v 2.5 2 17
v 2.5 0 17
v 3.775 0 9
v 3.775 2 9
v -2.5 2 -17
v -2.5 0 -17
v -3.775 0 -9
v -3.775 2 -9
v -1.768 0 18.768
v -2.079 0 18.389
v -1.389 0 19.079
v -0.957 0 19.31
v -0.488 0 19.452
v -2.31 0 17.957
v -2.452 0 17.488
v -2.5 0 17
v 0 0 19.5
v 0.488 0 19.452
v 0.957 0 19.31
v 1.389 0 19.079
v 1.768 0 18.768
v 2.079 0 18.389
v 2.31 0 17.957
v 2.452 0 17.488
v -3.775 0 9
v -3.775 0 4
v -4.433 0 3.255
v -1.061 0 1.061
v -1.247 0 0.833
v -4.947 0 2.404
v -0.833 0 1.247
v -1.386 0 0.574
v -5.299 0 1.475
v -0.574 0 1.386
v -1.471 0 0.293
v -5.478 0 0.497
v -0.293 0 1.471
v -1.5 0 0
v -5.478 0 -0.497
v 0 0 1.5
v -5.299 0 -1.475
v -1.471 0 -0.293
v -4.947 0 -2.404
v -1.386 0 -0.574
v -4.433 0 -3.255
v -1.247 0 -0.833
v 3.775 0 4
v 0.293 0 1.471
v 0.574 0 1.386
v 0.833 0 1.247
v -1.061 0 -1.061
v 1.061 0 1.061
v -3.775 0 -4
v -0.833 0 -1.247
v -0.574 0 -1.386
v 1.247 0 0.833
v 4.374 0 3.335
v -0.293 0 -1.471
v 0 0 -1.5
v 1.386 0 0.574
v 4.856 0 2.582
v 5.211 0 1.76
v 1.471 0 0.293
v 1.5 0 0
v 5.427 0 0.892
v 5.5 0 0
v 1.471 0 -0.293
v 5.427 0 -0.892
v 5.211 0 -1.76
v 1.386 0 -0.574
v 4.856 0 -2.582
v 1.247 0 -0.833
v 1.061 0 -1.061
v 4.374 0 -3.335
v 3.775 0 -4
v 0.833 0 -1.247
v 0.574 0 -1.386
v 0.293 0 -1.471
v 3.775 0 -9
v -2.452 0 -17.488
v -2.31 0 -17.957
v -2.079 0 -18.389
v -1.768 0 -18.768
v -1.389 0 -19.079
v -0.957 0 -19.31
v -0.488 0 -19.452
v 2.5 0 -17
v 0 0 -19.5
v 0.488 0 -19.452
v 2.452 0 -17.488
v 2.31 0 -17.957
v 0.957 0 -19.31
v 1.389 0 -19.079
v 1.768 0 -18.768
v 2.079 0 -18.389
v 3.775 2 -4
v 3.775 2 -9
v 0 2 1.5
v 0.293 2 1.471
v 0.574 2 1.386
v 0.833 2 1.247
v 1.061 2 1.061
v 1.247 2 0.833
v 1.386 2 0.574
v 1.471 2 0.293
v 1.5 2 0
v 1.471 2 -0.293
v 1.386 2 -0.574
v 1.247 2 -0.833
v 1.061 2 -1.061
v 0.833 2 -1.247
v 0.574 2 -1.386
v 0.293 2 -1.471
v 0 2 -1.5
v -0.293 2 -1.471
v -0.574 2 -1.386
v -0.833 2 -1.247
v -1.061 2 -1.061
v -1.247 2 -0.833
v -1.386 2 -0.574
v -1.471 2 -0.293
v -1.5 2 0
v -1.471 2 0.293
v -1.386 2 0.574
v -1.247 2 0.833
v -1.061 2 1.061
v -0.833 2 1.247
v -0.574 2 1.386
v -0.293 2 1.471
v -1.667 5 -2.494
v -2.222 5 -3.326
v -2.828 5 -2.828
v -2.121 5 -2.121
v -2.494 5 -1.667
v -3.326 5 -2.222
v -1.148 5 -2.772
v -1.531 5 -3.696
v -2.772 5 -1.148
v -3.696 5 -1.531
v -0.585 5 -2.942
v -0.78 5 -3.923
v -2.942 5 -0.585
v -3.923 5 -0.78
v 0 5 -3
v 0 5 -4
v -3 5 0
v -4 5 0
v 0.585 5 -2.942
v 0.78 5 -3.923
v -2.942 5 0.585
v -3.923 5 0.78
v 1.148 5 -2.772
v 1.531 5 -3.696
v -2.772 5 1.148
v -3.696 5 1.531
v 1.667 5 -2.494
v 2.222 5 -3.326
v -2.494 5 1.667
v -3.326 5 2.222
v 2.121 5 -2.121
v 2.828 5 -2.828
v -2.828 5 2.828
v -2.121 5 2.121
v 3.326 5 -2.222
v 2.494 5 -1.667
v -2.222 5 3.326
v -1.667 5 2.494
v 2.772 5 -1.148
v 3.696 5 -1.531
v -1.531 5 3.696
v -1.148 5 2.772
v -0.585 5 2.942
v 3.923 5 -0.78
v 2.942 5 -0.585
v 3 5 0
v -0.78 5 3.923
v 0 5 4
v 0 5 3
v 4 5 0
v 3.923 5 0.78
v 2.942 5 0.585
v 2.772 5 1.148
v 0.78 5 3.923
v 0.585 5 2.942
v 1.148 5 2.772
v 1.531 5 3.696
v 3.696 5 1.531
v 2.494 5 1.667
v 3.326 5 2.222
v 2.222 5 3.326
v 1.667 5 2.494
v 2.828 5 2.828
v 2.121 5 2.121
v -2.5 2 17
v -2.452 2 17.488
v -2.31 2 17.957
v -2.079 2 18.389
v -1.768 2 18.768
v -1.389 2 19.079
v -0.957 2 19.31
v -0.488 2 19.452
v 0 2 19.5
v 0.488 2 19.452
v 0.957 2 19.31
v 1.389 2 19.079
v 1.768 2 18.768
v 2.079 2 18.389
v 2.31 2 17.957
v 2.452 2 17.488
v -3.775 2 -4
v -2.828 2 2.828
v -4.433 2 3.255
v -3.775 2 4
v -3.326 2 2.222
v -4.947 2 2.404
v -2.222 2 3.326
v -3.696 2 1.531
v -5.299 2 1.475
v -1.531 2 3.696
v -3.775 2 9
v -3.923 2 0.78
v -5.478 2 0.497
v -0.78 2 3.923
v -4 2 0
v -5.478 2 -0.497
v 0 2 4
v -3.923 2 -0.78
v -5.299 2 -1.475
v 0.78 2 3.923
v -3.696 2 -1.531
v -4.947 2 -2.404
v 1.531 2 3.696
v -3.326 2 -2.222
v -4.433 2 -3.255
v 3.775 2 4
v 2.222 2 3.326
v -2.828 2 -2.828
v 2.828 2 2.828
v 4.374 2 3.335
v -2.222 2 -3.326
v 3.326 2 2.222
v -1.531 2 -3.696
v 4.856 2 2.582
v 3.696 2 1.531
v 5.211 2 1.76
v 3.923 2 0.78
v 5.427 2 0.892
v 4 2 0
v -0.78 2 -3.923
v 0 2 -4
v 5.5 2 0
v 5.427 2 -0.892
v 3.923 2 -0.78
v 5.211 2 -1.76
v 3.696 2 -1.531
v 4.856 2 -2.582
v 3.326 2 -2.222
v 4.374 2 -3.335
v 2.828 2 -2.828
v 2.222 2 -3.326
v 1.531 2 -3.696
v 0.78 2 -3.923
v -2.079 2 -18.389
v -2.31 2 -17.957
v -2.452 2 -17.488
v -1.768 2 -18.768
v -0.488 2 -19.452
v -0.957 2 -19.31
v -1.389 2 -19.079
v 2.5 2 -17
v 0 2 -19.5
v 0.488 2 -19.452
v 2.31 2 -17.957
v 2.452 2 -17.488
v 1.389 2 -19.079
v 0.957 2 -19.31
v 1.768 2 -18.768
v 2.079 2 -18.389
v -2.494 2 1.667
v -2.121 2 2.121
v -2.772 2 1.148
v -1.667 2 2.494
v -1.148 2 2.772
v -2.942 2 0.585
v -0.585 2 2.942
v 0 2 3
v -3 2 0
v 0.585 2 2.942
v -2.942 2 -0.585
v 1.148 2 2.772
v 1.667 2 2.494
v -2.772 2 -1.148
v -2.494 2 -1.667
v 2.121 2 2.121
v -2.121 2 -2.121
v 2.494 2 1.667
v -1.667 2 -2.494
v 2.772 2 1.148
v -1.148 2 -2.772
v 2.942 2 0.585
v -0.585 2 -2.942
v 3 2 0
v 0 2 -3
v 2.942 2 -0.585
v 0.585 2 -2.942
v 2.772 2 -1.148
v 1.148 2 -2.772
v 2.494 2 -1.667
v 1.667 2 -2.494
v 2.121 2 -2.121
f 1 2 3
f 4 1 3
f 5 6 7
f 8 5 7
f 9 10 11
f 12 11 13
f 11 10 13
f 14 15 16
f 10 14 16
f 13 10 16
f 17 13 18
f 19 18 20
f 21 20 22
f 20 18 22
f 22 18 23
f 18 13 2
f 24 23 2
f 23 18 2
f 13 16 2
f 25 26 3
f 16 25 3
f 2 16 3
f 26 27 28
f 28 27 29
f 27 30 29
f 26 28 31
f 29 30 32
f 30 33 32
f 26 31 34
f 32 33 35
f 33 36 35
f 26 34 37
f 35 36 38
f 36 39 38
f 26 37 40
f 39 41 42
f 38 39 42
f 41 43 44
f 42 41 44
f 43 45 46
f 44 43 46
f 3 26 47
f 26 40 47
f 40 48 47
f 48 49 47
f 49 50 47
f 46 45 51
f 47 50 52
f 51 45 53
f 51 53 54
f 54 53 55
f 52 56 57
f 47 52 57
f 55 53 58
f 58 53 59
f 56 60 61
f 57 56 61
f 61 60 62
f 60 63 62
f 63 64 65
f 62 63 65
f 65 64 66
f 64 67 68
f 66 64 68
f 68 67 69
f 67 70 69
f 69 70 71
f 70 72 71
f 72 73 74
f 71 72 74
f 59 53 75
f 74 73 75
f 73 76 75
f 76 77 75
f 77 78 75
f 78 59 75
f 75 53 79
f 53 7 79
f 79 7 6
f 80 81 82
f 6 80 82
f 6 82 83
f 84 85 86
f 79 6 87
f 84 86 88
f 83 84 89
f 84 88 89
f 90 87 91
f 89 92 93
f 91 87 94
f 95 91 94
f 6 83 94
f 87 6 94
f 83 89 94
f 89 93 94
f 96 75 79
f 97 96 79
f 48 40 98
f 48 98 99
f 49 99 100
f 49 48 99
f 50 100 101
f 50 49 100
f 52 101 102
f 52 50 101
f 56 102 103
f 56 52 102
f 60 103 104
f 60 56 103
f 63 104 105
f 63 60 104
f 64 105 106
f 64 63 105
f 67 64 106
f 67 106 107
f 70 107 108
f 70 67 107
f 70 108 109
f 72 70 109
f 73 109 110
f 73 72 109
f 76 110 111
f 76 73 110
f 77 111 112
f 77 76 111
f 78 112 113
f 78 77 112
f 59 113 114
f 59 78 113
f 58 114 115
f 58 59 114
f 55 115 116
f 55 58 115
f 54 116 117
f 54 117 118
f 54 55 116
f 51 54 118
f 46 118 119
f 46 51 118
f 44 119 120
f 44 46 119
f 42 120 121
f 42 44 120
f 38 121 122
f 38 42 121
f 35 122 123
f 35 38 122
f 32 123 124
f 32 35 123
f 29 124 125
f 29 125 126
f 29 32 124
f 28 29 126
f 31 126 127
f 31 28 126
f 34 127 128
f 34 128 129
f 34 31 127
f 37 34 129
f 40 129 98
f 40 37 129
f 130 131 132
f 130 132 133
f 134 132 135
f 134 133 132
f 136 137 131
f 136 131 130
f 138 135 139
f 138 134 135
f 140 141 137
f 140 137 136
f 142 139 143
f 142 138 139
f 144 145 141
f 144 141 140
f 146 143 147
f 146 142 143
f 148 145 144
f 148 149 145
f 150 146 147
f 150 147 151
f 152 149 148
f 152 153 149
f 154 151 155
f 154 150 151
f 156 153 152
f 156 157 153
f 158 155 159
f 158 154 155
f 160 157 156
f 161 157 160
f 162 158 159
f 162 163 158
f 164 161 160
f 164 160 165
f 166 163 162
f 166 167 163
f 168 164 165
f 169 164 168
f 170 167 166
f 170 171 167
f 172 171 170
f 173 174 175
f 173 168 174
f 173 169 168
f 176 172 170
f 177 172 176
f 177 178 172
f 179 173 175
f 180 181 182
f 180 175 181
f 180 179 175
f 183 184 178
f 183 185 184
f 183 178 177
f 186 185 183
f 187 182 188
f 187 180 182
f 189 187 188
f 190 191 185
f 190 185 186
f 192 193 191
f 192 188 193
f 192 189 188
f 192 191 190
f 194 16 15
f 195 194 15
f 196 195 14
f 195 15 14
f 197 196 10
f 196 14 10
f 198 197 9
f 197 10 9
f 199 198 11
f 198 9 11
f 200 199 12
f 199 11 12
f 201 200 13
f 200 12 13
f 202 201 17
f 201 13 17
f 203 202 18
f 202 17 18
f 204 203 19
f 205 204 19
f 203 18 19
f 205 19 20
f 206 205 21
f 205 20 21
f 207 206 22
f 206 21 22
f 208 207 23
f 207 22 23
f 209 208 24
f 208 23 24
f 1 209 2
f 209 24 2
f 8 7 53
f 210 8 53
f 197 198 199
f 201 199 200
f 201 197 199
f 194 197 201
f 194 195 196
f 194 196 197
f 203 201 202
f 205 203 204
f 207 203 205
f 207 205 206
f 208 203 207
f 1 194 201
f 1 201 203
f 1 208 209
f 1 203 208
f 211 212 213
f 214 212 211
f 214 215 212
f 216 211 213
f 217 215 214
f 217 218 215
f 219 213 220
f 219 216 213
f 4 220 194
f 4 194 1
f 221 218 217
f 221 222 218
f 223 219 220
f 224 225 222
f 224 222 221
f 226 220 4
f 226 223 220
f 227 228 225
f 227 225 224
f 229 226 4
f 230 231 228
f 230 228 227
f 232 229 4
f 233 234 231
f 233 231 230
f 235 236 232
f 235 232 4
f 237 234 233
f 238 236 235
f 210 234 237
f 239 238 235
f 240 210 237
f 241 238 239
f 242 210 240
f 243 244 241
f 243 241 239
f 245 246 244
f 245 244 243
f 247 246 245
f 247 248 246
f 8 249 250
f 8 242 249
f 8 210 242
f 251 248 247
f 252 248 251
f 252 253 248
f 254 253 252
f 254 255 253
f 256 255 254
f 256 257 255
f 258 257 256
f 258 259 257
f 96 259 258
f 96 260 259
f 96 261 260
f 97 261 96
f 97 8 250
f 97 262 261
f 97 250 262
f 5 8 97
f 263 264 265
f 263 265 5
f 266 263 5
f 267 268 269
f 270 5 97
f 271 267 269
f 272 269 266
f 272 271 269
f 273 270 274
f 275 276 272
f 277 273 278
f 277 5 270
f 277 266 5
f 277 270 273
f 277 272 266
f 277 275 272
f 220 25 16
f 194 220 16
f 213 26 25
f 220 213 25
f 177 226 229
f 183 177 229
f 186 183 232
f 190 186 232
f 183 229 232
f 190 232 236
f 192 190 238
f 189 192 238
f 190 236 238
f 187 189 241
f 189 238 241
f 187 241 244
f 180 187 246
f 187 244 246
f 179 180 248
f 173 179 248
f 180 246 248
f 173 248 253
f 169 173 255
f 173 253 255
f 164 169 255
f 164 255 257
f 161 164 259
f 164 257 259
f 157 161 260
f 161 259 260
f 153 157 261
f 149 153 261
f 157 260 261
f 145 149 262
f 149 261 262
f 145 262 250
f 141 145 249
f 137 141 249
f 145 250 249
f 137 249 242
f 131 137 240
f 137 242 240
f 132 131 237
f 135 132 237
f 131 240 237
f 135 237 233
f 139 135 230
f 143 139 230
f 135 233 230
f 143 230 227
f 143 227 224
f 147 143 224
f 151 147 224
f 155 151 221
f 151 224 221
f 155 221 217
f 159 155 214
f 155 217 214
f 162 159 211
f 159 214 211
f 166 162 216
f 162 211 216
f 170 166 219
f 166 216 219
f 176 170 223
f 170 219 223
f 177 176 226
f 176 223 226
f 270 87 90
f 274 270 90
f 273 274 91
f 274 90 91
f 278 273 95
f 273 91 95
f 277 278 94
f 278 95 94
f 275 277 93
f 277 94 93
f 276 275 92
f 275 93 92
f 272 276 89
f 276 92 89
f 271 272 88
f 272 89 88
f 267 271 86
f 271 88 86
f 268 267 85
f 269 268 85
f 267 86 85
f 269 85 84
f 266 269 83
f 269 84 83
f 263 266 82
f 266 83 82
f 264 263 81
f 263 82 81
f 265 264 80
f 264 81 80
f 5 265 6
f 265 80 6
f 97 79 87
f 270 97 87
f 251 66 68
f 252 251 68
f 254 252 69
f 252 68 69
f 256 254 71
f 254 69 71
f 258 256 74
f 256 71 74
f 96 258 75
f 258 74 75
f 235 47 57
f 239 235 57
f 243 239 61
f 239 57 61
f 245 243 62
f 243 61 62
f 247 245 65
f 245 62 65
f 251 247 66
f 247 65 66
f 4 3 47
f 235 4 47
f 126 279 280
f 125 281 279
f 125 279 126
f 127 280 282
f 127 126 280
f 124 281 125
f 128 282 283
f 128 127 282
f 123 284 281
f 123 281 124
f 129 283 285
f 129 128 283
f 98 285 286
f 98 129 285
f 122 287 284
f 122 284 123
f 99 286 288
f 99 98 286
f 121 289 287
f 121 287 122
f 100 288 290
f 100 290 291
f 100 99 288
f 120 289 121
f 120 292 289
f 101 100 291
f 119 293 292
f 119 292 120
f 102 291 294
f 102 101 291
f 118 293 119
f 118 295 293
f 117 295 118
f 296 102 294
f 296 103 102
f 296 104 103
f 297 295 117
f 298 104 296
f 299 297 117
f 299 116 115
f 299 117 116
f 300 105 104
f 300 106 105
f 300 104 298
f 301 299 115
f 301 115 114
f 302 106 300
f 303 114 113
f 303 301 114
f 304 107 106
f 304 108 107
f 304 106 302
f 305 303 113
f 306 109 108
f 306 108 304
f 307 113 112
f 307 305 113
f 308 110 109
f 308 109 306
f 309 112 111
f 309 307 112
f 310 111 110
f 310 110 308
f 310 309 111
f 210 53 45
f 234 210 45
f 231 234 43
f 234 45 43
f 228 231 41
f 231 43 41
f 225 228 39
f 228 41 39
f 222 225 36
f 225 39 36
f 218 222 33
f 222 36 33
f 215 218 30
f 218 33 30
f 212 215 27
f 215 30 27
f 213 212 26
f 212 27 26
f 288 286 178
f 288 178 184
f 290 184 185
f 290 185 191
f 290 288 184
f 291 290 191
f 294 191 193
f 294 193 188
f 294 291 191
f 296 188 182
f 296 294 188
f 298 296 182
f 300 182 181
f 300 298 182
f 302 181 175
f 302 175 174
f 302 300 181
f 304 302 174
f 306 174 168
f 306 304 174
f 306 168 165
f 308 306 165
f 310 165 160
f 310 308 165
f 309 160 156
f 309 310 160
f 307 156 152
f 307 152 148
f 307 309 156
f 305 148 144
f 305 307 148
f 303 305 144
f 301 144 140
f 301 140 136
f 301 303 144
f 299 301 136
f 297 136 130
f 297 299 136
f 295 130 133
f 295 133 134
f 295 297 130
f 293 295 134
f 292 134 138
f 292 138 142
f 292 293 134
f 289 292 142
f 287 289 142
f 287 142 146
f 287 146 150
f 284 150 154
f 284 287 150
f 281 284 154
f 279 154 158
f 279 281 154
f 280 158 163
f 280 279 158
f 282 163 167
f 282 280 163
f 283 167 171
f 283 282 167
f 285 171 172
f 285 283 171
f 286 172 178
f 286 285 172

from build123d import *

# Parameters (mm, degrees)
SKETCH1_R           = 1.5
BOSS_EXTRUDE1_DEPTH = 2
SKETCH2_R           = 4
SKETCH2_R_2         = 3
BOSS_EXTRUDE2_DEPTH = 3


with BuildPart() as part:
    # Sketch1 → Boss-Extrude1 (new body)
    # profile 1 of 5: a face of its own
    with BuildSketch(Plane(origin=(0, 0, 0), x_dir=(1, 0, 0), z_dir=(0, 1, 0))):
        with BuildLine():
            Line((-3.774917218, 9), (-3.774917218, 4))
            ThreePointArc((-3.774917218, 4), (0, 5.5), (3.774917218, 4))
            Line((3.774917218, 4), (3.774917218, 9))
            Line((3.774917218, 9), (2.5, 17))
            ThreePointArc((2.5, 17), (0, 19.5), (-2.5, 17))
            Line((-2.5, 17), (-3.774917218, 9))
        make_face()
    # profile 2 of 5: a face of its own
    with BuildSketch(Plane(origin=(0, 0, 0), x_dir=(1, 0, 0), z_dir=(0, 1, 0))):
        with BuildLine():
            Line((3.774917218, 4), (-3.774917218, 4))
            ThreePointArc((-3.774917218, 4), (-5.5, 0), (-3.774917218, -4))
            Line((-3.774917218, -4), (3.774917218, -4))
            ThreePointArc((3.774917218, -4), (5.050348735, -2.178067412), (5.5, 0))
            ThreePointArc((5.5, 0), (5.050348735, 2.178067412), (3.774917218, 4))
        make_face()
        with Locations(Location((0, 0, 0), (0, 0, 270))):
            Circle(SKETCH1_R, mode=Mode.SUBTRACT)
    # profile 3 of 5: a face of its own
    with BuildSketch(Plane(origin=(0, 0, 0), x_dir=(1, 0, 0), z_dir=(0, 1, 0))):
        with BuildLine():
            ThreePointArc((3.774917218, 4), (0, 5.5), (-3.774917218, 4))
            Line((-3.774917218, 4), (3.774917218, 4))
        make_face()
    # profile 4 of 5: a face of its own
    with BuildSketch(Plane(origin=(0, 0, 0), x_dir=(1, 0, 0), z_dir=(0, 1, 0))):
        with BuildLine():
            Line((3.774917218, -4), (-3.774917218, -4))
            ThreePointArc((-3.774917218, -4), (0, -5.5), (3.774917218, -4))
        make_face()
    # profile 5 of 5: a face of its own
    with BuildSketch(Plane(origin=(0, 0, 0), x_dir=(1, 0, 0), z_dir=(0, 1, 0))):
        with BuildLine():
            ThreePointArc((3.774917218, -4), (0, -5.5), (-3.774917218, -4))
            Line((-3.774917218, -4), (-3.774917218, -9))
            Line((-3.774917218, -9), (-2.5, -17))
            ThreePointArc((-2.5, -17), (0, -19.5), (2.5, -17))
            Line((2.5, -17), (3.774917218, -9))
            Line((3.774917218, -9), (3.774917218, -4))
        make_face()
    extrude(amount=BOSS_EXTRUDE1_DEPTH)

    # Sketch2 → Boss-Extrude2 (add)
    with BuildSketch(Plane(origin=(0, 2, 0), x_dir=(1, 0, 0), z_dir=(0, 1, 0))):
        with Locations(Location((0, 0, 0), (0, 0, 270))):
            Circle(SKETCH2_R)
        with Locations(Location((0, 0, 0), (0, 0, 270))):
            Circle(SKETCH2_R_2, mode=Mode.SUBTRACT)
    extrude(amount=BOSS_EXTRUDE2_DEPTH)


solid = part.part
